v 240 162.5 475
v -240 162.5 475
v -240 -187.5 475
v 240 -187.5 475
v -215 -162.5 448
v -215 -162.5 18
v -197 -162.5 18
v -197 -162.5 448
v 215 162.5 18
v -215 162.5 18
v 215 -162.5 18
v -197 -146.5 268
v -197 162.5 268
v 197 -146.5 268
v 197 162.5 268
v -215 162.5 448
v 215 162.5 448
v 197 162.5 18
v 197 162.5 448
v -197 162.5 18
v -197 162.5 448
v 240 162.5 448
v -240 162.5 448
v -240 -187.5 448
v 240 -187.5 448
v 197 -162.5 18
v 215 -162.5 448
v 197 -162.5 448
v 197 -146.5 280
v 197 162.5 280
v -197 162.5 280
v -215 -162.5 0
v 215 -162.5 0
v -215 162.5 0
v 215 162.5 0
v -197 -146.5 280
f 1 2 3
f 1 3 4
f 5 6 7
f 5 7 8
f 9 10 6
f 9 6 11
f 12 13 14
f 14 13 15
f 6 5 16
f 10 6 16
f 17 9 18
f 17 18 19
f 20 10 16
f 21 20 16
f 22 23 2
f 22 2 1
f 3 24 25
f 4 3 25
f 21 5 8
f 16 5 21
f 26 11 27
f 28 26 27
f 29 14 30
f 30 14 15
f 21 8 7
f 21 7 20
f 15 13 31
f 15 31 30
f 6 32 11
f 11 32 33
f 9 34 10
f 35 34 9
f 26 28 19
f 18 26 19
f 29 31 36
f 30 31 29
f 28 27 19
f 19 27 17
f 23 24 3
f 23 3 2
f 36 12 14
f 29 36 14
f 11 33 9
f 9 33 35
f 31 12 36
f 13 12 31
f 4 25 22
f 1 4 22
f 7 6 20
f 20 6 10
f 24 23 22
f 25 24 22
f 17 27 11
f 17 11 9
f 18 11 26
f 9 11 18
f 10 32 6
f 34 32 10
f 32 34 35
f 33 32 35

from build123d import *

# Parameters (mm, degrees)
F0_W     = 430
F0_H     = 325
F1_DEPTH = 18
F2_W     = 325
F2_H     = 430
F3_DEPTH = 18
F5_W     = 480
F5_H     = 350
F6_DEPTH = 27
F8_W     = 394
F8_H     = 309
F9_DEPTH = 12


with BuildPart() as f1:
    # F0 (on Top) → F1 (new body)
    with BuildSketch(Plane.XY):
        Rectangle(F0_W, F0_H)
    extrude(amount=F1_DEPTH)


with BuildPart() as f3:
    # F2 (on face) → F3 (new body)
    with BuildSketch(Plane.YZ.offset(215)):
        with Locations((0, 233)):
            Rectangle(F2_W, F2_H)
    extrude(amount=-F3_DEPTH)


with BuildPart() as f4_1:
    # F4: instance of F3
    add(f3.part.mirror(Plane.YZ))


with BuildPart() as f6:
    # F5 (on face) → F6 (new body)
    with BuildSketch(Plane.XY.offset(448)):
        with Locations((0, -12.5)):
            Rectangle(F5_W, F5_H)
    extrude(amount=F6_DEPTH)


with BuildPart() as f9:
    # F8 (on offset) → F9 (new body)
    with BuildSketch(Plane.XY.offset(268)):
        with Locations((0, 8)):
            Rectangle(F8_W, F8_H)
    extrude(amount=F9_DEPTH)


solid = Compound([f1.part, f3.part, f4_1.part, f6.part, f9.part])
